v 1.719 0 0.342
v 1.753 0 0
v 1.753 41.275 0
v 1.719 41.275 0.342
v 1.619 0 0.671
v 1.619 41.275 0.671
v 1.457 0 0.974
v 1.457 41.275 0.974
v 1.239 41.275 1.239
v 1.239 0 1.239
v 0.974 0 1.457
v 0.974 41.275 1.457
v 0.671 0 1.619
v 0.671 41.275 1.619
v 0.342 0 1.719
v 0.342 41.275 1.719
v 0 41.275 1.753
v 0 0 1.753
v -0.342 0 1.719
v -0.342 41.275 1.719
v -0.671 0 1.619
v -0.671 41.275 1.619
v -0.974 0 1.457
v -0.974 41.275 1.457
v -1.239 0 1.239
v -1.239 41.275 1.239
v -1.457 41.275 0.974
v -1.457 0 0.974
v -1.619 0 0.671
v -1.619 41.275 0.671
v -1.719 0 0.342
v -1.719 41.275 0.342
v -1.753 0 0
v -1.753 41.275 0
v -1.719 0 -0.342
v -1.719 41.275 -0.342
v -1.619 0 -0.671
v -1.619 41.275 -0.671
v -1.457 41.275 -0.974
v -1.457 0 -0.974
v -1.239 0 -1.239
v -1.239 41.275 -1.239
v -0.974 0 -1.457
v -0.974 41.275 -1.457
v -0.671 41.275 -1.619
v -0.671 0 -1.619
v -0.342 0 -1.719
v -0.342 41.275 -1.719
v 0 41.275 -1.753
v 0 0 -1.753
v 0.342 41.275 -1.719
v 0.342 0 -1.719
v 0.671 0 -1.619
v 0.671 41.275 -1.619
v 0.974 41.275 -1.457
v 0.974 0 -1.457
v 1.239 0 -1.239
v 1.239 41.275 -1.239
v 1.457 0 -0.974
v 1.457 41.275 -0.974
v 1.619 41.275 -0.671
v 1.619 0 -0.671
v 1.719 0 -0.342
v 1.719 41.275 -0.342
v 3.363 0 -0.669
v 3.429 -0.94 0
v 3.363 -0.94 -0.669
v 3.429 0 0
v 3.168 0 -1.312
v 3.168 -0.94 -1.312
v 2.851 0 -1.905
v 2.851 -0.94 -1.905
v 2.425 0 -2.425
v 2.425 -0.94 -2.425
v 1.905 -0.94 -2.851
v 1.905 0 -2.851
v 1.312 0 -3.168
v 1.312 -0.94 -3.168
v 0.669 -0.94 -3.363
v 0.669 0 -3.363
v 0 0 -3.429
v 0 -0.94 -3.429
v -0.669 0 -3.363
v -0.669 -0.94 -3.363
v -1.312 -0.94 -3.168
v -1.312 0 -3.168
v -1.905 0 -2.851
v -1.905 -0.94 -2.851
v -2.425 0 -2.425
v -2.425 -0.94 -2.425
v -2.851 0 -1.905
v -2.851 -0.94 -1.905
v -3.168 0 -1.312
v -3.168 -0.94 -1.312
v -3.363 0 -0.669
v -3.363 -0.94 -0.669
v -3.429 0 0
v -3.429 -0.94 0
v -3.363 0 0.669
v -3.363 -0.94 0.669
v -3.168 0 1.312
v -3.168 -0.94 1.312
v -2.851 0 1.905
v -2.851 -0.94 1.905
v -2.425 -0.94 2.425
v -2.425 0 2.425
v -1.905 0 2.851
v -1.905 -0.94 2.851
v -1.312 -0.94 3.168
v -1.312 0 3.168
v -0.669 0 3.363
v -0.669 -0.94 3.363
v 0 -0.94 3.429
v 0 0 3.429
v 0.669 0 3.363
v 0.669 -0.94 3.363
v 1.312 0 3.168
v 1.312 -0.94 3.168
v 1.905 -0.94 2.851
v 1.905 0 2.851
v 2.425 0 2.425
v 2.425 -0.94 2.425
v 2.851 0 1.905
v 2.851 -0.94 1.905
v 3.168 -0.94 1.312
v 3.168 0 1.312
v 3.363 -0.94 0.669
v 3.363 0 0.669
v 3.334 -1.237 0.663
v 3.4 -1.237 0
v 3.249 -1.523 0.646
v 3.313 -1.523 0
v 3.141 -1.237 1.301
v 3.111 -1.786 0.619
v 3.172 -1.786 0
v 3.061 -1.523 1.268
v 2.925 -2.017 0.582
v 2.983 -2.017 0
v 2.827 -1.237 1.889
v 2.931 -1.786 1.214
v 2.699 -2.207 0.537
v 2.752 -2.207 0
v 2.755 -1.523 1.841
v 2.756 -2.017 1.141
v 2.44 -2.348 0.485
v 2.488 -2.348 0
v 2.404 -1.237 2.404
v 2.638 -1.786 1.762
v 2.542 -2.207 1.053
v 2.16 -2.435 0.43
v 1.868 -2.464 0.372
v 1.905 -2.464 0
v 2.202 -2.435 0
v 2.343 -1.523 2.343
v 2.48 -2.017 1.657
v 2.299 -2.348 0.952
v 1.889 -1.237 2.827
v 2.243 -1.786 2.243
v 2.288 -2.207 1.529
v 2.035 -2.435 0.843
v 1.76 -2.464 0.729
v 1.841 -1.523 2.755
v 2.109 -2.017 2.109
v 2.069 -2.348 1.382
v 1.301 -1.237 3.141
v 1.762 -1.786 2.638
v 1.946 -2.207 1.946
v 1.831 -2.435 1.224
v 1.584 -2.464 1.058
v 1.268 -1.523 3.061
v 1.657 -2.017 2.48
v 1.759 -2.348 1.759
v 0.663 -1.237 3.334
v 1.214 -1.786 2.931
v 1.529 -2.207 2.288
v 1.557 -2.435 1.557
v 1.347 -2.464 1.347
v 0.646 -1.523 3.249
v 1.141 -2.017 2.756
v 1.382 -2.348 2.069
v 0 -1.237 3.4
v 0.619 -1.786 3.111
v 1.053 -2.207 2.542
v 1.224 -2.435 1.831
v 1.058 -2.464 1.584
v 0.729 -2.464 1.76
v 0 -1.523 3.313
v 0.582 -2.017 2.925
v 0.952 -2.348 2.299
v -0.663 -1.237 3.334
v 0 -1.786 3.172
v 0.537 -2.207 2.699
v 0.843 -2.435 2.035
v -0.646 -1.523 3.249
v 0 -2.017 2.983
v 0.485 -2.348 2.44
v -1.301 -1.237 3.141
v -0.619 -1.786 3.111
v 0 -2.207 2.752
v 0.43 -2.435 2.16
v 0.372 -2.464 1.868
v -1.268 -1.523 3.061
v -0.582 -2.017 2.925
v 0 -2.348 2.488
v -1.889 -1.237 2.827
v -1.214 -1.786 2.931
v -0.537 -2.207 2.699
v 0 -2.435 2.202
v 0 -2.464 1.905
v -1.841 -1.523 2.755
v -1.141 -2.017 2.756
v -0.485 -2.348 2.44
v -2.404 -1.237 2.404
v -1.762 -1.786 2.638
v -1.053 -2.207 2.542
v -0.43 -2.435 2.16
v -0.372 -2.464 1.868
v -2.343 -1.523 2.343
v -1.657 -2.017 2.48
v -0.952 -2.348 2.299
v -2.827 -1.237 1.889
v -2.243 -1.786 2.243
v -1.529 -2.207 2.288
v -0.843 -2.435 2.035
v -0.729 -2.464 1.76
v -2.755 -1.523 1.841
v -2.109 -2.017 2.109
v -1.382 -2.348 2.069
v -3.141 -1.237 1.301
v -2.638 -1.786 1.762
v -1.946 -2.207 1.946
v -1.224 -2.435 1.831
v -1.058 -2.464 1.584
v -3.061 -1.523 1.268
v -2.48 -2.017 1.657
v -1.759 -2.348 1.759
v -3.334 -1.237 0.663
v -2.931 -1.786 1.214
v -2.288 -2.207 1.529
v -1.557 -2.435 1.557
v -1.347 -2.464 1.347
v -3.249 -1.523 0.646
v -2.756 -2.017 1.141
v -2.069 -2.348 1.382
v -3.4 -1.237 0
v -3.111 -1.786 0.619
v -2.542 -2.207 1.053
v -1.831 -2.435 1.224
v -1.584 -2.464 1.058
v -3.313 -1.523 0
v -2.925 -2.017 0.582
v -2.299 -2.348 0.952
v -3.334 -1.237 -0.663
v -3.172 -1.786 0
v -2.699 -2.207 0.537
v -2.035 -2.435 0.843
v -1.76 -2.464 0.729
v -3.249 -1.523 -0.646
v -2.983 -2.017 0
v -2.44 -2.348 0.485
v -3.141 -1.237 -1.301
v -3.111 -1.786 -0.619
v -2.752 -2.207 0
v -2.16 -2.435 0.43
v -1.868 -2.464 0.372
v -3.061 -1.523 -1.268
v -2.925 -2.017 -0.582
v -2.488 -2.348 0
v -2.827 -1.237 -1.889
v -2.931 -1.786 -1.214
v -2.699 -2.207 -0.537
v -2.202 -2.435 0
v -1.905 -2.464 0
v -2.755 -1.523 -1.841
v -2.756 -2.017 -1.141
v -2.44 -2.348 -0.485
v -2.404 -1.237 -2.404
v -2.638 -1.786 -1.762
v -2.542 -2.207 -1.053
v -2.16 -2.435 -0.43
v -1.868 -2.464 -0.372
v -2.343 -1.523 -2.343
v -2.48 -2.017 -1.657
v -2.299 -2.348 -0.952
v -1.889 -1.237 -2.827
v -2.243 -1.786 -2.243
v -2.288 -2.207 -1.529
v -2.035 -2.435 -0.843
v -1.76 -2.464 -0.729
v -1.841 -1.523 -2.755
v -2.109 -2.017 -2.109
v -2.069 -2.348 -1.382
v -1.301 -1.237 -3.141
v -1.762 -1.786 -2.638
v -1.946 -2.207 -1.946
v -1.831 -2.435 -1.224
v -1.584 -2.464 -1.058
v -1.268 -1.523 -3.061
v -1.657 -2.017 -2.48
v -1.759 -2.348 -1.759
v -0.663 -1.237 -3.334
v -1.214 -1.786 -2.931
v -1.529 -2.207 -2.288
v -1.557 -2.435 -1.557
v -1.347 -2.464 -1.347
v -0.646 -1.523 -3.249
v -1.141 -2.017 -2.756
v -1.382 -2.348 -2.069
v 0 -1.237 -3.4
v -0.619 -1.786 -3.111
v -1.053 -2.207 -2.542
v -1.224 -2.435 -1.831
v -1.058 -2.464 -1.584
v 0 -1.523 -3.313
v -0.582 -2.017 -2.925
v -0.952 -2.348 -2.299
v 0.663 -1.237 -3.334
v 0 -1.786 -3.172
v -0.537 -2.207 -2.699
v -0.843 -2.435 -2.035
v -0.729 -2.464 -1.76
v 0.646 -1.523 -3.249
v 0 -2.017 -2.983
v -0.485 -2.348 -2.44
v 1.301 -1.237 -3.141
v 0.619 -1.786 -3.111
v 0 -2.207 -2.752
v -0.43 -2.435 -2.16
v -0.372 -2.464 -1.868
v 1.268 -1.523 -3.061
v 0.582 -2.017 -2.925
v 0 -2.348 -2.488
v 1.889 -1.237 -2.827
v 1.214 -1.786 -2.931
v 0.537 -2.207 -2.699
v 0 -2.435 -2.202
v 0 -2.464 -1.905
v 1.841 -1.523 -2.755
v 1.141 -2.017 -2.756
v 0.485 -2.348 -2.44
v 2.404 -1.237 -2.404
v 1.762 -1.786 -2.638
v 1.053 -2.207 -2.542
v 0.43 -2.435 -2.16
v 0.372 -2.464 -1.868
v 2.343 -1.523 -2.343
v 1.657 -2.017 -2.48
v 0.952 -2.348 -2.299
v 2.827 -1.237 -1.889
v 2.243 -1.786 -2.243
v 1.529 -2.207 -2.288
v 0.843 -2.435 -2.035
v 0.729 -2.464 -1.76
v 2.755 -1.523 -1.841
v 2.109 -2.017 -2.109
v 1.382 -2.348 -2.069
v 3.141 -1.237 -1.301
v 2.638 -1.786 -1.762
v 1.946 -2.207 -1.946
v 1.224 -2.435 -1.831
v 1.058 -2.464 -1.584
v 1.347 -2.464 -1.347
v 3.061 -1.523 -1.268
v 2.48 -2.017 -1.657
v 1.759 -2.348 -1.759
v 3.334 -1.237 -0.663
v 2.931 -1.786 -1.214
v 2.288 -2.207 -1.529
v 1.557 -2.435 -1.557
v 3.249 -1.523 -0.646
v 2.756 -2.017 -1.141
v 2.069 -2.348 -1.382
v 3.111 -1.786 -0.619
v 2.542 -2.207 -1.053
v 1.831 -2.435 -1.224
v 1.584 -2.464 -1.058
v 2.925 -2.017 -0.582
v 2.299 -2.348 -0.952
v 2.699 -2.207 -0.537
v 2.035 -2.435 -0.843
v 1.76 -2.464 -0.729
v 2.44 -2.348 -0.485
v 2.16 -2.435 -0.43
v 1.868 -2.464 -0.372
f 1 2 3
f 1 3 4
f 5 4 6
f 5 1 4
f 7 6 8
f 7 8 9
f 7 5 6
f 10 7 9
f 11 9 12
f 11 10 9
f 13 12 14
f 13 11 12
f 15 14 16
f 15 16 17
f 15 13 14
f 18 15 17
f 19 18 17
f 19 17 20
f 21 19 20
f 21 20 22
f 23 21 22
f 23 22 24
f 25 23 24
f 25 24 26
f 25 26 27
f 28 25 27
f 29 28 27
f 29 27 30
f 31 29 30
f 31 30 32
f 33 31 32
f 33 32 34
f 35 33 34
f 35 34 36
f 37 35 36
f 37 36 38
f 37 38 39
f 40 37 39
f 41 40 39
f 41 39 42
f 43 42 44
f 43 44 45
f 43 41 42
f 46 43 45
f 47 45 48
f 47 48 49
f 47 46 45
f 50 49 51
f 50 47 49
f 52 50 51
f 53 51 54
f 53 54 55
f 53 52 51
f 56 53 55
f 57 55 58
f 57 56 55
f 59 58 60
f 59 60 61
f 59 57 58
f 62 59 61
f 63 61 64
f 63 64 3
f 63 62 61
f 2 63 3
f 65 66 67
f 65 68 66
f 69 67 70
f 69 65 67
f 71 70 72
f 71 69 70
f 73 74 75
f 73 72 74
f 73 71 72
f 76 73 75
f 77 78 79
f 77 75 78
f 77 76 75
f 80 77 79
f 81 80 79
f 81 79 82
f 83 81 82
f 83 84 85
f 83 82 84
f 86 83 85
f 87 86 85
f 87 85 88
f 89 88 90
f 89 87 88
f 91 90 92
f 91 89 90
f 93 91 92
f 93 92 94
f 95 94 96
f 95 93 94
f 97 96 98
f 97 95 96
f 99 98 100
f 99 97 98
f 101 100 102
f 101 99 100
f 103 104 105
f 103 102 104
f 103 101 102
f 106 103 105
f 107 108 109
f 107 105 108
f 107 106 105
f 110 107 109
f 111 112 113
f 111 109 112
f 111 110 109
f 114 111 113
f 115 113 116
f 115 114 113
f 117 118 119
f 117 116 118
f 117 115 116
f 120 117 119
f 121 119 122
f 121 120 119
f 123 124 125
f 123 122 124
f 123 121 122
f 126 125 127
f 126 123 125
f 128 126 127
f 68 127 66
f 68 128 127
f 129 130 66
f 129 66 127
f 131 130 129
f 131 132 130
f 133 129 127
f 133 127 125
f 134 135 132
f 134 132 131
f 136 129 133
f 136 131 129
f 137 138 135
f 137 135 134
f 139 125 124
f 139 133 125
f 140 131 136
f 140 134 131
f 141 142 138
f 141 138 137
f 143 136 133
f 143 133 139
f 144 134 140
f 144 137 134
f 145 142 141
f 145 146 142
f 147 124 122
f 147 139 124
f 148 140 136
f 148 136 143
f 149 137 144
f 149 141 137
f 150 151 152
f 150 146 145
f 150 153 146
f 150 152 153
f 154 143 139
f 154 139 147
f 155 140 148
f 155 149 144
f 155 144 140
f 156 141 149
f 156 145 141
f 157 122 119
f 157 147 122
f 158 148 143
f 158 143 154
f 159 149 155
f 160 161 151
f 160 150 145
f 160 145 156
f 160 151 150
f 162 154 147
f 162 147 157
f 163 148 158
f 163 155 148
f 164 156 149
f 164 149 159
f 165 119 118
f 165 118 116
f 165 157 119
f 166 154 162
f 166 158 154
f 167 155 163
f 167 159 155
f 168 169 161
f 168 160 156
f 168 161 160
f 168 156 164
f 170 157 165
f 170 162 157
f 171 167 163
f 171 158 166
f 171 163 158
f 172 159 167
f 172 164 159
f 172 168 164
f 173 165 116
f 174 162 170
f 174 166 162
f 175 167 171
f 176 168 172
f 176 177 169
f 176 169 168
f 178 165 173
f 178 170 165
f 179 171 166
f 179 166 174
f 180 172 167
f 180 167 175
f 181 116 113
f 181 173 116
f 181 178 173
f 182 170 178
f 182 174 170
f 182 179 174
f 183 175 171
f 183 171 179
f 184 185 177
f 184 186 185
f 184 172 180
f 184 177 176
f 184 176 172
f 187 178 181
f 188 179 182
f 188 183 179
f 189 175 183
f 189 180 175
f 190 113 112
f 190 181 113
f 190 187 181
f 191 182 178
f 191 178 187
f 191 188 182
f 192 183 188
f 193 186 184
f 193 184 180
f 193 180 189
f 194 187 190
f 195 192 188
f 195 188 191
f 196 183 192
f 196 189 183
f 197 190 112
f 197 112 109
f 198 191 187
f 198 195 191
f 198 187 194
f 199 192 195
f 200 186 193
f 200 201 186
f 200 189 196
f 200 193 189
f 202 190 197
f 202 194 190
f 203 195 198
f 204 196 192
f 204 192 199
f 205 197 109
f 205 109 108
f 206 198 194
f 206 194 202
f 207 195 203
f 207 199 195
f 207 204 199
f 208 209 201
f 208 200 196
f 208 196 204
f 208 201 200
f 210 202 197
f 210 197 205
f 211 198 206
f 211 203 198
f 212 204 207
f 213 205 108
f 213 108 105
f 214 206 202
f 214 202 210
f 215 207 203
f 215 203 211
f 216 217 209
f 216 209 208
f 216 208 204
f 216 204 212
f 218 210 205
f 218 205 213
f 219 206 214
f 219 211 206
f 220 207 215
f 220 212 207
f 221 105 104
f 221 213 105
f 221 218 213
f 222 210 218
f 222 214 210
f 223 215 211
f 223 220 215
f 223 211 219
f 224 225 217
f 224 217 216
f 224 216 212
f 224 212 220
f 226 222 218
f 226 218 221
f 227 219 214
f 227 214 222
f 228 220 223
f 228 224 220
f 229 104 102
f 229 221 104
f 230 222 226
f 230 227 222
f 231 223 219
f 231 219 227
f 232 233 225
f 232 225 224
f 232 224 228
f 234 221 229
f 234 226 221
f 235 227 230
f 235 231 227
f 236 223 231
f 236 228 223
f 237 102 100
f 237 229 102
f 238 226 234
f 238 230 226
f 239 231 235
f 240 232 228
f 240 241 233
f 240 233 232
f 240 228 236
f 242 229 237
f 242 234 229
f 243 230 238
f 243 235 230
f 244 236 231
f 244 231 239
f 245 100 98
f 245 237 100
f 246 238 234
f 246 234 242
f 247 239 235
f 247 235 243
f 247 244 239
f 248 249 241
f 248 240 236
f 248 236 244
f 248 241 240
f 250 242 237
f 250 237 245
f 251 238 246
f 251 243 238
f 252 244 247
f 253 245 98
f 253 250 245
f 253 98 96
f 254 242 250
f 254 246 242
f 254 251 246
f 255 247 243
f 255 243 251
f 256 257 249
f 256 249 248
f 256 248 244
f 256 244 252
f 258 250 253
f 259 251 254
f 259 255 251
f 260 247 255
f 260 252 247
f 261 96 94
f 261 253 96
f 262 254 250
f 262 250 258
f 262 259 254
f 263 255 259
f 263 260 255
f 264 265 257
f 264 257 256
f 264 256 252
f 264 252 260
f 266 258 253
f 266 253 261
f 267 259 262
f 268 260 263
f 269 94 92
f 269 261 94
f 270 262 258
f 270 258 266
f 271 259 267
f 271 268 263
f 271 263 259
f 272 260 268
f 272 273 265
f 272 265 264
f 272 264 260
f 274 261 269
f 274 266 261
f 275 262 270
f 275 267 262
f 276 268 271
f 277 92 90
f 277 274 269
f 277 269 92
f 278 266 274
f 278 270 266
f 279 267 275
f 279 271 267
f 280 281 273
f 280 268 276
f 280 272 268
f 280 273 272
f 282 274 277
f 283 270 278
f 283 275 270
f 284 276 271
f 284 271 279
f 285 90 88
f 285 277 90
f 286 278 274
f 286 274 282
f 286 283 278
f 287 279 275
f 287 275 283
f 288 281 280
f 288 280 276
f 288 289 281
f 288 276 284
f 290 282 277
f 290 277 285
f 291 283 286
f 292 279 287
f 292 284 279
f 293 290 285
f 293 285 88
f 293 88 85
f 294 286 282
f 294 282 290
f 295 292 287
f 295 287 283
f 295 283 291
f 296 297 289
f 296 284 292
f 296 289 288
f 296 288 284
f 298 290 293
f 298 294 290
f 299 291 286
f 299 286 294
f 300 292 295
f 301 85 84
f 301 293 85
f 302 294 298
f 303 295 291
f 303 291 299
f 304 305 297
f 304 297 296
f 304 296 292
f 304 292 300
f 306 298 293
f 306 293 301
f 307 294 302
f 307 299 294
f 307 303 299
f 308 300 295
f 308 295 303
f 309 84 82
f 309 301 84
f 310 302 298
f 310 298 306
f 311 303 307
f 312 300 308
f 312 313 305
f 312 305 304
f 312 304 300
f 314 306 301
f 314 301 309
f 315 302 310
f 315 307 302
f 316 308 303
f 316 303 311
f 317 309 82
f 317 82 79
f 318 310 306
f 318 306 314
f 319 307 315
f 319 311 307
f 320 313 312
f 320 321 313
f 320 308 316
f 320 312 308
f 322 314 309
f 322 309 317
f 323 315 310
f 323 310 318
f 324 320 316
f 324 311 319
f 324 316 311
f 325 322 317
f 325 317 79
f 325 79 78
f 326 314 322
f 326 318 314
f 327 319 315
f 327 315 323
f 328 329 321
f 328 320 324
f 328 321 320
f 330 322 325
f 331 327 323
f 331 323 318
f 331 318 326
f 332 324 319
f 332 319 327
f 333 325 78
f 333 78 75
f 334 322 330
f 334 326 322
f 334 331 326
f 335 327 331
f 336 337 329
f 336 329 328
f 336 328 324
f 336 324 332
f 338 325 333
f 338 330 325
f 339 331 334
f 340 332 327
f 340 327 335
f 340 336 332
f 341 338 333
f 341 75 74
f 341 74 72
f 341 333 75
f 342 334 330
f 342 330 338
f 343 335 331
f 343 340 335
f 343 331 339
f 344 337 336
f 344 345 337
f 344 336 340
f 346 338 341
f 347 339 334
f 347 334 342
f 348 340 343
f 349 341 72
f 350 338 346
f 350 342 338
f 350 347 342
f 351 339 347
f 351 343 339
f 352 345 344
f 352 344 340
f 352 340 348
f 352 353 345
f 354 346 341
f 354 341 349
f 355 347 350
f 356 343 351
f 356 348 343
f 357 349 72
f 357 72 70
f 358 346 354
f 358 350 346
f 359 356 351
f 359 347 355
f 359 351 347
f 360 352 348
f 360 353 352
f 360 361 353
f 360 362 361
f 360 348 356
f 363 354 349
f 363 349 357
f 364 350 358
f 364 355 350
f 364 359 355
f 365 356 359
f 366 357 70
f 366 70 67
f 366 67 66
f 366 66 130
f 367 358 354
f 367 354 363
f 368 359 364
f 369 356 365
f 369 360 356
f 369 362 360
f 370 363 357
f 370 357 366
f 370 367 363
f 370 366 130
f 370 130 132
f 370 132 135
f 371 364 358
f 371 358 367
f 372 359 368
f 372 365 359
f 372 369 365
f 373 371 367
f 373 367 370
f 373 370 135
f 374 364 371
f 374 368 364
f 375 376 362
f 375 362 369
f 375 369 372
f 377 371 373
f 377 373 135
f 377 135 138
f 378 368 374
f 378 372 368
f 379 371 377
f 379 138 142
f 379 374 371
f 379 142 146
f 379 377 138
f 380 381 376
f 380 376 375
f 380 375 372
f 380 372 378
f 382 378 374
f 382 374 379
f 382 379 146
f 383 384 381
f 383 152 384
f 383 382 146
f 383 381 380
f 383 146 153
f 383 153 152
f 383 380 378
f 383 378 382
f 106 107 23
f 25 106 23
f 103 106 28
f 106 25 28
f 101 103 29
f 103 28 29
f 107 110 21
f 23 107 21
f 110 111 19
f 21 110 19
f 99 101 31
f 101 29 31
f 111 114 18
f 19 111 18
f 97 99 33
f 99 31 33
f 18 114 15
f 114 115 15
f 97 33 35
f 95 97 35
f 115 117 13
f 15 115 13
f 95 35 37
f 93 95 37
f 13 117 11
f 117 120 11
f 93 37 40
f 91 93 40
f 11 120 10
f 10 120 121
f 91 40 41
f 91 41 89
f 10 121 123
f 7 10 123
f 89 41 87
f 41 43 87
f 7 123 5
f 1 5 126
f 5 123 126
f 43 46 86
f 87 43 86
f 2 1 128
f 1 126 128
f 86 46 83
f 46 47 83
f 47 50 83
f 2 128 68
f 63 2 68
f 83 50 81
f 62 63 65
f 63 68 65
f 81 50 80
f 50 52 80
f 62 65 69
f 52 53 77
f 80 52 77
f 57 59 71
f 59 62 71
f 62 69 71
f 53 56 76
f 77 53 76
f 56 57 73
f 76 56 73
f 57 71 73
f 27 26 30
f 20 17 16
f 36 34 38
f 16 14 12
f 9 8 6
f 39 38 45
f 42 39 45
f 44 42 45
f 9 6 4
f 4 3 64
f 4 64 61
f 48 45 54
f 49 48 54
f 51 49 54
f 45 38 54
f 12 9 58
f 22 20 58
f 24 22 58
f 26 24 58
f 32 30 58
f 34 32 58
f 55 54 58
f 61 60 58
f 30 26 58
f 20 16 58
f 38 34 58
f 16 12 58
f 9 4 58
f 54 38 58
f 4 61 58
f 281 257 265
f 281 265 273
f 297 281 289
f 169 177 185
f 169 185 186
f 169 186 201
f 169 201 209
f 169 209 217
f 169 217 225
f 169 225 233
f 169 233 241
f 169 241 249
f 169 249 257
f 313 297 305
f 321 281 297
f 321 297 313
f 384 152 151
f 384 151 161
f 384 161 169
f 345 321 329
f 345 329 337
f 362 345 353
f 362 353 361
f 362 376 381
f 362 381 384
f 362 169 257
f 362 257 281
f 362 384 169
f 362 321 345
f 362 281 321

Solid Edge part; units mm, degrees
sketch "Sketch1" plane through (0, 0, 0) normal (0, -1, 0) x (1, 0, 0)
  circle A0 centre (0, 0) radius 1.7526
  dimension "D1" = 3.5052
extrude "Protrusion1" add sketch "Sketch1" against normal blind 41.275
cosmetic_thread "Thread1" size "#6-32 UNC"
sketch "Sketch2" plane through (0, 0, 0) normal (0, -1, 0) x (1, 0, 0)
  circle A0 centre (0, 0) radius 3.429
  dimension "D1" = 6.858
extrude "ExtrudedProtrusion_2" add sketch "Sketch2" along normal blind 2.4638
fillet "Round_1" radius 1.524 1 edges at (-3.429, -2.4638, 0)
properties part number "91772A159"
